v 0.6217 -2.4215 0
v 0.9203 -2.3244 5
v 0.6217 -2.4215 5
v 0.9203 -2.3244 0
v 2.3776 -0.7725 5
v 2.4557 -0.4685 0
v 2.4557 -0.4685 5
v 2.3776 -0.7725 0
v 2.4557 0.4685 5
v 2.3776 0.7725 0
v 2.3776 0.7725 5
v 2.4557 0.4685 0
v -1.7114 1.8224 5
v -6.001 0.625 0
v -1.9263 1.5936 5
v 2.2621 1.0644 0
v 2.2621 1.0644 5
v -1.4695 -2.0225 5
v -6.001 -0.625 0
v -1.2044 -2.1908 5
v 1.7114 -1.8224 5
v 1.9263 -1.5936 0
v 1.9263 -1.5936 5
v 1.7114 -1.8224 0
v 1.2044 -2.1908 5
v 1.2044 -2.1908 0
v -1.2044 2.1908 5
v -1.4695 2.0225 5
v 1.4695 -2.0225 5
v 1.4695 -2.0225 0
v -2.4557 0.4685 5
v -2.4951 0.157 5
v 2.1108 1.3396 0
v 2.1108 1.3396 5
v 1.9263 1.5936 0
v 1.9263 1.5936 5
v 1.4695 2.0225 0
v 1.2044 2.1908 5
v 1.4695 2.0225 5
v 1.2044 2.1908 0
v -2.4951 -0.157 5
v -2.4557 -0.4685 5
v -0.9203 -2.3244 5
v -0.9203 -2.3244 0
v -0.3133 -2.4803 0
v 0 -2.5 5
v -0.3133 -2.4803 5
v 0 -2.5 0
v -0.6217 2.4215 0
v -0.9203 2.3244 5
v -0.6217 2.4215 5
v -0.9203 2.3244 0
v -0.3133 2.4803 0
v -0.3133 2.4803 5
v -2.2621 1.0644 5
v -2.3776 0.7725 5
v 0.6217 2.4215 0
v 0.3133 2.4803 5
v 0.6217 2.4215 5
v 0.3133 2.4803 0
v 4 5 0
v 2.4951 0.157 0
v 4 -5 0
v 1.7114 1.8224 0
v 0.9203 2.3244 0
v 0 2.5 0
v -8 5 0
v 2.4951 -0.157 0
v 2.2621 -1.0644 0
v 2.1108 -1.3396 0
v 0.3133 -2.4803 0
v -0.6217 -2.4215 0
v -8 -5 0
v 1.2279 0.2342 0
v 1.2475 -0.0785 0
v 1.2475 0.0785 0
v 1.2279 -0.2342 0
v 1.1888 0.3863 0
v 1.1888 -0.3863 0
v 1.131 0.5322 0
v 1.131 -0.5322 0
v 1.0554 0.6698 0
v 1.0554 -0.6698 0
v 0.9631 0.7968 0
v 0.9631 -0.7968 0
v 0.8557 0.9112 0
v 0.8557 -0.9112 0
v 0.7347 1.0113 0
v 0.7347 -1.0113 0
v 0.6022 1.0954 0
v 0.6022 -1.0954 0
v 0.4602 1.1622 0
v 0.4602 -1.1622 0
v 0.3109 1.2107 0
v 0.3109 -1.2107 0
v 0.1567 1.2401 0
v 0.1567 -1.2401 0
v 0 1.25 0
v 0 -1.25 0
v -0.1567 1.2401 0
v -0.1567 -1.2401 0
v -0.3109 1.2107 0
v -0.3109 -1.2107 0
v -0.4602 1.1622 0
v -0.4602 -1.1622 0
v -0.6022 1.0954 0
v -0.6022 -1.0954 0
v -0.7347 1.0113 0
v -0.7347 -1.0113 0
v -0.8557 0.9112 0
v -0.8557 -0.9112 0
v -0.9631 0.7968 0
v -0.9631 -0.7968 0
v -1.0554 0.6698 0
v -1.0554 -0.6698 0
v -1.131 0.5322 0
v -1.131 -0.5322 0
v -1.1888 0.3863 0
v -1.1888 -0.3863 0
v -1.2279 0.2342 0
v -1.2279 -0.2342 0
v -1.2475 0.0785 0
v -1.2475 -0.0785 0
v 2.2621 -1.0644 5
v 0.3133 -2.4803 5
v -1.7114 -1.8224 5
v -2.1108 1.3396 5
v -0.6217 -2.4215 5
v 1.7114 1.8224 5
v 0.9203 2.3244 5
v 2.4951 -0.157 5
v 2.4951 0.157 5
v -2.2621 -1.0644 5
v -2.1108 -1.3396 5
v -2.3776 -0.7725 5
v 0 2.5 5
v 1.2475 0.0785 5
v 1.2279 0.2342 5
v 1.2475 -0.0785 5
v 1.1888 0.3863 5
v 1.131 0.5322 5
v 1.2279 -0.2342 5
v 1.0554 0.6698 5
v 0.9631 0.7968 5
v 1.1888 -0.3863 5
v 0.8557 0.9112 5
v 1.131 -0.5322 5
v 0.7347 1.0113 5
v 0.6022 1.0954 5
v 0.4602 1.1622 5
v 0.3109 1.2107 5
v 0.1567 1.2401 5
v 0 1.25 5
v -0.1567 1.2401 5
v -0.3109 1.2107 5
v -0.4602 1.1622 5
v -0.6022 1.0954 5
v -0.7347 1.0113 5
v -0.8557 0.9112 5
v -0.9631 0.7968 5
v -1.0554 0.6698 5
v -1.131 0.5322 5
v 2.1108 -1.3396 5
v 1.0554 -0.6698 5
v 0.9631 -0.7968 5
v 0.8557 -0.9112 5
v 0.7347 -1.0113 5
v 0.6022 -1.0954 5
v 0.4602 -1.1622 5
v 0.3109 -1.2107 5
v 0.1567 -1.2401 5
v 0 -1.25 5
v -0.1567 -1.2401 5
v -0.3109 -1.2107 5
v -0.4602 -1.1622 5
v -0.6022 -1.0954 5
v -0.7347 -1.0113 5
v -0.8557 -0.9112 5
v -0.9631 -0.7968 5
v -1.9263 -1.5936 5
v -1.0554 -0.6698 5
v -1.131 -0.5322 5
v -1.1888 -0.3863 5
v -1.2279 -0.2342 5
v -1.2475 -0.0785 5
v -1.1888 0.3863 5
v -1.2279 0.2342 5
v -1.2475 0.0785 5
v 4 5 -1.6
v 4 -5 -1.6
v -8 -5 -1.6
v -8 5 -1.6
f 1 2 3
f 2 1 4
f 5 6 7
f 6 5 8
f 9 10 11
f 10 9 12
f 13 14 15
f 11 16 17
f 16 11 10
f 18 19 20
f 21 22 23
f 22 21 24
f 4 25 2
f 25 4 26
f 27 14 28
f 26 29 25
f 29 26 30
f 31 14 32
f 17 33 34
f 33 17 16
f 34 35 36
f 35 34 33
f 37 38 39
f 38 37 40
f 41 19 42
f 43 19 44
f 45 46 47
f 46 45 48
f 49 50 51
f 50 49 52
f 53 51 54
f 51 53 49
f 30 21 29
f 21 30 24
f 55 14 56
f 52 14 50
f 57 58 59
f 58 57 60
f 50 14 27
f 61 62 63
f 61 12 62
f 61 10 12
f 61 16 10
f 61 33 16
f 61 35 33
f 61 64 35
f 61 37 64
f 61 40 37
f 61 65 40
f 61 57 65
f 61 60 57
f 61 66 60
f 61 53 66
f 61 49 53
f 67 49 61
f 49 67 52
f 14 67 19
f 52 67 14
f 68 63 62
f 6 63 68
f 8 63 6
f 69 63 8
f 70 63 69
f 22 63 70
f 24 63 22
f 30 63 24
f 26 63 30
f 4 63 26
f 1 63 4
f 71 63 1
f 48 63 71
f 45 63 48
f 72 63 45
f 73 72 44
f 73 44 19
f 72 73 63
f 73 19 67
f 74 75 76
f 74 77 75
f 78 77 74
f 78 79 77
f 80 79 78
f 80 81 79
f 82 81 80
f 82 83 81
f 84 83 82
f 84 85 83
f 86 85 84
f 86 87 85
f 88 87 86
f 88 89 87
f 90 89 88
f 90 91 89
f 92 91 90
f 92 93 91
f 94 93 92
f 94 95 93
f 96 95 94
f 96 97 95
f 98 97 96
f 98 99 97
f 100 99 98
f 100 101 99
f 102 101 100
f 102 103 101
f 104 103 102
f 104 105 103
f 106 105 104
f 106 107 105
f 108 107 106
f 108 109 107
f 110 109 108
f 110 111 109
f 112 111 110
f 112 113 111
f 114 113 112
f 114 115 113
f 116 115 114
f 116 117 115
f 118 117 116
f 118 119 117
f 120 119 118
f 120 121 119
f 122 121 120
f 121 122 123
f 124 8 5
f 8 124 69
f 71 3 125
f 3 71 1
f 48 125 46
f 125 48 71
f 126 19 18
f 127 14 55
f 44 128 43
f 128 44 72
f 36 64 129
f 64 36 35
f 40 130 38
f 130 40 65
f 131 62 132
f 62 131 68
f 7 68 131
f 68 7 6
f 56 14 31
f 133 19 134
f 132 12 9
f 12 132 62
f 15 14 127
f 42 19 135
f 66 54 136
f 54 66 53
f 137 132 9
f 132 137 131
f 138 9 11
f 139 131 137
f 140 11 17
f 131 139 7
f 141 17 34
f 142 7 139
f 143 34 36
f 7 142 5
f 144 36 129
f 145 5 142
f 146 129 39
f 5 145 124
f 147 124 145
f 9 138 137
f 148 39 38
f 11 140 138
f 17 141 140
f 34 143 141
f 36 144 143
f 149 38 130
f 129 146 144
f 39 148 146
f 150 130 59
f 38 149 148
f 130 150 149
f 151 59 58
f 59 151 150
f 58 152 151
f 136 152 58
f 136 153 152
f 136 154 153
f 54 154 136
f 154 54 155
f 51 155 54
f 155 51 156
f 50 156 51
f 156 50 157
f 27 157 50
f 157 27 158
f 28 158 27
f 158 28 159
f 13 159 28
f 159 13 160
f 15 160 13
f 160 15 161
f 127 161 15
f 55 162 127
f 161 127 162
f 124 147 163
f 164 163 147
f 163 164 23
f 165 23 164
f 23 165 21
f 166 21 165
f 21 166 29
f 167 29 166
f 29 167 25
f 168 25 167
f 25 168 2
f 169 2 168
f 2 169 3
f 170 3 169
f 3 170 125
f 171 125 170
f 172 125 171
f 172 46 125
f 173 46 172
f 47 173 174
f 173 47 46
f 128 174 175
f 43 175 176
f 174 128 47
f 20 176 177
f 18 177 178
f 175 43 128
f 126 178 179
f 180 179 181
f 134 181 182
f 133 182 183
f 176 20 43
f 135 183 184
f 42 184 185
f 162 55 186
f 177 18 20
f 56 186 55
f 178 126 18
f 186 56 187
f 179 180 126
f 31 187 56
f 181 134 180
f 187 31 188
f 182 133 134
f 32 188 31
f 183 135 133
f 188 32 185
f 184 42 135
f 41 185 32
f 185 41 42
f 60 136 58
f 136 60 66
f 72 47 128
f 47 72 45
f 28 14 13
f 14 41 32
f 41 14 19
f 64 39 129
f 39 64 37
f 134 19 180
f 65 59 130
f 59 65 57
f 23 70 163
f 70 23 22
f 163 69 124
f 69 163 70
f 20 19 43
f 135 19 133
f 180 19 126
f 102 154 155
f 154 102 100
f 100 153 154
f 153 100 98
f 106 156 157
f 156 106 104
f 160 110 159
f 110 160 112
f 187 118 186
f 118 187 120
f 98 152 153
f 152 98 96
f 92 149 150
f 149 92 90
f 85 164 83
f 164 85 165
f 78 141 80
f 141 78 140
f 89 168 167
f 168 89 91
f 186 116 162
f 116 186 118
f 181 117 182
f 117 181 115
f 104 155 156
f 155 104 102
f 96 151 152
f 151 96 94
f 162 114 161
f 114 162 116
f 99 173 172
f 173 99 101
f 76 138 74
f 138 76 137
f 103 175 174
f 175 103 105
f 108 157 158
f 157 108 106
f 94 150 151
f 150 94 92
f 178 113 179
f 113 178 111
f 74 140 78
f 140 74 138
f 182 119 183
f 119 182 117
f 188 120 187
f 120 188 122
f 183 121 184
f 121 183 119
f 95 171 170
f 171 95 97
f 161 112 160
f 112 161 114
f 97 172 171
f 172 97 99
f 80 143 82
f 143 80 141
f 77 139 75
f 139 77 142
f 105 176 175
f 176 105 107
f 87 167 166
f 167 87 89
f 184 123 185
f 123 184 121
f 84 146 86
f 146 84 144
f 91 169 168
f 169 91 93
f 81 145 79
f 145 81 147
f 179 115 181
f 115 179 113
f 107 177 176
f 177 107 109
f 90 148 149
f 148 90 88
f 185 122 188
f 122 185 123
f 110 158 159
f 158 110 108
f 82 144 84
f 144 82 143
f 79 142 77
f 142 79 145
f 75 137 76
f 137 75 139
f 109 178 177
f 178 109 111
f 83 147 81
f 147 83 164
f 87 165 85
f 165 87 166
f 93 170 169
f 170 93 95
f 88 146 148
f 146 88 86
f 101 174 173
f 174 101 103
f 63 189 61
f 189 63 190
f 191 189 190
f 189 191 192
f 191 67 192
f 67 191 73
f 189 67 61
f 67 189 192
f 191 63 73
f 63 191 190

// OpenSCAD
module RaspiMount(height, overhang) {
  conv_zero = 1e-308;

  d_radius = 2.5 / 2;

  // for screw to cut into plastic ,normaly smaller , but this is not working
  // well at that size
  d1_radius = 2.5 / 2;

  hole_radius = d_radius - (d_radius - d1_radius) / 4;
  head_radius = d_radius * 2;

  baseplate_height = (height / tan(overhang) + head_radius);
  baseplate_width = hole_radius;

  difference() {
    hull() {
      translate([ 0, 0, height / 2 ])
          cylinder(h = height, r = head_radius, center = true);

      // cube(size = [ baseplate, baseplate, conv_zero ], center = true);
      translate([ -baseplate_width / 2, 0, 0 ])
          cube(size = [ baseplate_width, baseplate_height, conv_zero ]);
    }

    translate([ 0, 0, height / 2 ])
        cylinder(h = height, r = hole_radius, center = true);
  }
}

module RaspiMounts(height, overhang) {

  holes = [
    [ 3.5, 3.5 ], [ 3.5 + 58, 3.5 ], [ 3.5, 3.5 + 49 ], [ 3.5 + 58, 3.5 + 49 ]
  ];

  for (i = holes)
    translate([ i[0], i[1], 0 ]) rotate([ 0, 0, 90 ])
        RaspiMount(height, overhang);
}

rotate([ 0, 0, 90 ]) RaspiMount(height = 5, overhang = 55, $fn = 50);
translate([ -2, 0, -1.6 / 2 ]) cube([ 12, 10, 1.6 ], center = true);
